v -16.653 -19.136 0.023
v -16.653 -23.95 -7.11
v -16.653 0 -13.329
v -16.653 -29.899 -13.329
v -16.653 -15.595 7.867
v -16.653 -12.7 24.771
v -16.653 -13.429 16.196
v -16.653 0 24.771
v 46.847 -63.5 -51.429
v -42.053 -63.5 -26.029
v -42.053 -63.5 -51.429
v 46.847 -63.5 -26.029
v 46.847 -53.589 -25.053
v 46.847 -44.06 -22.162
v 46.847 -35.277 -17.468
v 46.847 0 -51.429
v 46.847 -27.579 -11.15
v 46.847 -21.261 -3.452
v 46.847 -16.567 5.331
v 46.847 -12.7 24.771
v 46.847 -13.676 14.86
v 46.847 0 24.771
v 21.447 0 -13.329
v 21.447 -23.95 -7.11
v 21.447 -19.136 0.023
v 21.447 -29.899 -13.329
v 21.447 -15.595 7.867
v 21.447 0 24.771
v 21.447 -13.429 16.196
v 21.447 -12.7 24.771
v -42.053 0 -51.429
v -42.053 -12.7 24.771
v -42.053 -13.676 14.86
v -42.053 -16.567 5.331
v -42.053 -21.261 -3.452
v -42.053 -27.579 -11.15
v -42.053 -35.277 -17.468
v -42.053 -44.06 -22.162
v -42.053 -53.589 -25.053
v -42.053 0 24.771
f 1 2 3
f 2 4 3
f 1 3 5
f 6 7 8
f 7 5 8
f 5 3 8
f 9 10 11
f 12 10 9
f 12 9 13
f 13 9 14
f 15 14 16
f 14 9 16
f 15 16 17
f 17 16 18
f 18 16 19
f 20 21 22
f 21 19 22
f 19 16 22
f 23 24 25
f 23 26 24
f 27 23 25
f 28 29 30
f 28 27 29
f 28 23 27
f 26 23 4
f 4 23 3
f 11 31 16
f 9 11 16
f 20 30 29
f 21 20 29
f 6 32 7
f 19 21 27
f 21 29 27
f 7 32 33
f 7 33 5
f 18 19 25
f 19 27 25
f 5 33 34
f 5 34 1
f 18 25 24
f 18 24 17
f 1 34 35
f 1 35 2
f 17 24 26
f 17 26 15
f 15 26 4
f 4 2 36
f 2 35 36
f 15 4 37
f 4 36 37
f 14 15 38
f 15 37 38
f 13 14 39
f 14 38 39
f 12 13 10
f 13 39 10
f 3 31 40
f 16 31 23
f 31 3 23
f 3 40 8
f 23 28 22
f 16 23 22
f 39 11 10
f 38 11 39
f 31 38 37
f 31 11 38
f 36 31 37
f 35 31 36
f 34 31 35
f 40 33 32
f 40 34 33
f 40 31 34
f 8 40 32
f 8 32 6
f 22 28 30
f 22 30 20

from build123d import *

# Parameters (mm, degrees)
F0_W     = 88.9
F0_H     = 76.2
F1_DEPTH = 63.5
F2_W     = 38.1
F2_H     = 38.1
F3_DEPTH = 63.501
F5_DEPTH = 88.901


with BuildPart() as f1:
    # F0 (on Front) → F1 (new body)
    with BuildSketch(Plane.XZ):
        with Locations((2.397262, -13.328955)):
            Rectangle(F0_W, F0_H)
    extrude(amount=F1_DEPTH)

    # F2 (on face) → F3 (cut, through all)
    with BuildSketch(Plane(origin=(0, 0, 0), x_dir=(-1, 0, 0), z_dir=(0, 1, 0))):
        with Locations((-2.397262, 5.721045)):
            Rectangle(F2_W, F2_H)
    extrude(amount=-F3_DEPTH, mode=Mode.SUBTRACT)

    # F4 (on face) → F5 (cut, through all)
    with BuildSketch(Plane(origin=(-42.052738, 0, 0), x_dir=(0, -1, 0), z_dir=(-1, 0, 0))):
        with BuildLine():
            Line((63.5, 24.771045), (12.7, 24.771045))
            ThreePointArc((12.7, 24.771045), (27.578976, -11.149979), (63.5, -26.028955))
            Line((63.5, -26.028955), (63.5, 24.771045))
        make_face()
    extrude(amount=-F5_DEPTH, mode=Mode.SUBTRACT)


solid = f1.part
